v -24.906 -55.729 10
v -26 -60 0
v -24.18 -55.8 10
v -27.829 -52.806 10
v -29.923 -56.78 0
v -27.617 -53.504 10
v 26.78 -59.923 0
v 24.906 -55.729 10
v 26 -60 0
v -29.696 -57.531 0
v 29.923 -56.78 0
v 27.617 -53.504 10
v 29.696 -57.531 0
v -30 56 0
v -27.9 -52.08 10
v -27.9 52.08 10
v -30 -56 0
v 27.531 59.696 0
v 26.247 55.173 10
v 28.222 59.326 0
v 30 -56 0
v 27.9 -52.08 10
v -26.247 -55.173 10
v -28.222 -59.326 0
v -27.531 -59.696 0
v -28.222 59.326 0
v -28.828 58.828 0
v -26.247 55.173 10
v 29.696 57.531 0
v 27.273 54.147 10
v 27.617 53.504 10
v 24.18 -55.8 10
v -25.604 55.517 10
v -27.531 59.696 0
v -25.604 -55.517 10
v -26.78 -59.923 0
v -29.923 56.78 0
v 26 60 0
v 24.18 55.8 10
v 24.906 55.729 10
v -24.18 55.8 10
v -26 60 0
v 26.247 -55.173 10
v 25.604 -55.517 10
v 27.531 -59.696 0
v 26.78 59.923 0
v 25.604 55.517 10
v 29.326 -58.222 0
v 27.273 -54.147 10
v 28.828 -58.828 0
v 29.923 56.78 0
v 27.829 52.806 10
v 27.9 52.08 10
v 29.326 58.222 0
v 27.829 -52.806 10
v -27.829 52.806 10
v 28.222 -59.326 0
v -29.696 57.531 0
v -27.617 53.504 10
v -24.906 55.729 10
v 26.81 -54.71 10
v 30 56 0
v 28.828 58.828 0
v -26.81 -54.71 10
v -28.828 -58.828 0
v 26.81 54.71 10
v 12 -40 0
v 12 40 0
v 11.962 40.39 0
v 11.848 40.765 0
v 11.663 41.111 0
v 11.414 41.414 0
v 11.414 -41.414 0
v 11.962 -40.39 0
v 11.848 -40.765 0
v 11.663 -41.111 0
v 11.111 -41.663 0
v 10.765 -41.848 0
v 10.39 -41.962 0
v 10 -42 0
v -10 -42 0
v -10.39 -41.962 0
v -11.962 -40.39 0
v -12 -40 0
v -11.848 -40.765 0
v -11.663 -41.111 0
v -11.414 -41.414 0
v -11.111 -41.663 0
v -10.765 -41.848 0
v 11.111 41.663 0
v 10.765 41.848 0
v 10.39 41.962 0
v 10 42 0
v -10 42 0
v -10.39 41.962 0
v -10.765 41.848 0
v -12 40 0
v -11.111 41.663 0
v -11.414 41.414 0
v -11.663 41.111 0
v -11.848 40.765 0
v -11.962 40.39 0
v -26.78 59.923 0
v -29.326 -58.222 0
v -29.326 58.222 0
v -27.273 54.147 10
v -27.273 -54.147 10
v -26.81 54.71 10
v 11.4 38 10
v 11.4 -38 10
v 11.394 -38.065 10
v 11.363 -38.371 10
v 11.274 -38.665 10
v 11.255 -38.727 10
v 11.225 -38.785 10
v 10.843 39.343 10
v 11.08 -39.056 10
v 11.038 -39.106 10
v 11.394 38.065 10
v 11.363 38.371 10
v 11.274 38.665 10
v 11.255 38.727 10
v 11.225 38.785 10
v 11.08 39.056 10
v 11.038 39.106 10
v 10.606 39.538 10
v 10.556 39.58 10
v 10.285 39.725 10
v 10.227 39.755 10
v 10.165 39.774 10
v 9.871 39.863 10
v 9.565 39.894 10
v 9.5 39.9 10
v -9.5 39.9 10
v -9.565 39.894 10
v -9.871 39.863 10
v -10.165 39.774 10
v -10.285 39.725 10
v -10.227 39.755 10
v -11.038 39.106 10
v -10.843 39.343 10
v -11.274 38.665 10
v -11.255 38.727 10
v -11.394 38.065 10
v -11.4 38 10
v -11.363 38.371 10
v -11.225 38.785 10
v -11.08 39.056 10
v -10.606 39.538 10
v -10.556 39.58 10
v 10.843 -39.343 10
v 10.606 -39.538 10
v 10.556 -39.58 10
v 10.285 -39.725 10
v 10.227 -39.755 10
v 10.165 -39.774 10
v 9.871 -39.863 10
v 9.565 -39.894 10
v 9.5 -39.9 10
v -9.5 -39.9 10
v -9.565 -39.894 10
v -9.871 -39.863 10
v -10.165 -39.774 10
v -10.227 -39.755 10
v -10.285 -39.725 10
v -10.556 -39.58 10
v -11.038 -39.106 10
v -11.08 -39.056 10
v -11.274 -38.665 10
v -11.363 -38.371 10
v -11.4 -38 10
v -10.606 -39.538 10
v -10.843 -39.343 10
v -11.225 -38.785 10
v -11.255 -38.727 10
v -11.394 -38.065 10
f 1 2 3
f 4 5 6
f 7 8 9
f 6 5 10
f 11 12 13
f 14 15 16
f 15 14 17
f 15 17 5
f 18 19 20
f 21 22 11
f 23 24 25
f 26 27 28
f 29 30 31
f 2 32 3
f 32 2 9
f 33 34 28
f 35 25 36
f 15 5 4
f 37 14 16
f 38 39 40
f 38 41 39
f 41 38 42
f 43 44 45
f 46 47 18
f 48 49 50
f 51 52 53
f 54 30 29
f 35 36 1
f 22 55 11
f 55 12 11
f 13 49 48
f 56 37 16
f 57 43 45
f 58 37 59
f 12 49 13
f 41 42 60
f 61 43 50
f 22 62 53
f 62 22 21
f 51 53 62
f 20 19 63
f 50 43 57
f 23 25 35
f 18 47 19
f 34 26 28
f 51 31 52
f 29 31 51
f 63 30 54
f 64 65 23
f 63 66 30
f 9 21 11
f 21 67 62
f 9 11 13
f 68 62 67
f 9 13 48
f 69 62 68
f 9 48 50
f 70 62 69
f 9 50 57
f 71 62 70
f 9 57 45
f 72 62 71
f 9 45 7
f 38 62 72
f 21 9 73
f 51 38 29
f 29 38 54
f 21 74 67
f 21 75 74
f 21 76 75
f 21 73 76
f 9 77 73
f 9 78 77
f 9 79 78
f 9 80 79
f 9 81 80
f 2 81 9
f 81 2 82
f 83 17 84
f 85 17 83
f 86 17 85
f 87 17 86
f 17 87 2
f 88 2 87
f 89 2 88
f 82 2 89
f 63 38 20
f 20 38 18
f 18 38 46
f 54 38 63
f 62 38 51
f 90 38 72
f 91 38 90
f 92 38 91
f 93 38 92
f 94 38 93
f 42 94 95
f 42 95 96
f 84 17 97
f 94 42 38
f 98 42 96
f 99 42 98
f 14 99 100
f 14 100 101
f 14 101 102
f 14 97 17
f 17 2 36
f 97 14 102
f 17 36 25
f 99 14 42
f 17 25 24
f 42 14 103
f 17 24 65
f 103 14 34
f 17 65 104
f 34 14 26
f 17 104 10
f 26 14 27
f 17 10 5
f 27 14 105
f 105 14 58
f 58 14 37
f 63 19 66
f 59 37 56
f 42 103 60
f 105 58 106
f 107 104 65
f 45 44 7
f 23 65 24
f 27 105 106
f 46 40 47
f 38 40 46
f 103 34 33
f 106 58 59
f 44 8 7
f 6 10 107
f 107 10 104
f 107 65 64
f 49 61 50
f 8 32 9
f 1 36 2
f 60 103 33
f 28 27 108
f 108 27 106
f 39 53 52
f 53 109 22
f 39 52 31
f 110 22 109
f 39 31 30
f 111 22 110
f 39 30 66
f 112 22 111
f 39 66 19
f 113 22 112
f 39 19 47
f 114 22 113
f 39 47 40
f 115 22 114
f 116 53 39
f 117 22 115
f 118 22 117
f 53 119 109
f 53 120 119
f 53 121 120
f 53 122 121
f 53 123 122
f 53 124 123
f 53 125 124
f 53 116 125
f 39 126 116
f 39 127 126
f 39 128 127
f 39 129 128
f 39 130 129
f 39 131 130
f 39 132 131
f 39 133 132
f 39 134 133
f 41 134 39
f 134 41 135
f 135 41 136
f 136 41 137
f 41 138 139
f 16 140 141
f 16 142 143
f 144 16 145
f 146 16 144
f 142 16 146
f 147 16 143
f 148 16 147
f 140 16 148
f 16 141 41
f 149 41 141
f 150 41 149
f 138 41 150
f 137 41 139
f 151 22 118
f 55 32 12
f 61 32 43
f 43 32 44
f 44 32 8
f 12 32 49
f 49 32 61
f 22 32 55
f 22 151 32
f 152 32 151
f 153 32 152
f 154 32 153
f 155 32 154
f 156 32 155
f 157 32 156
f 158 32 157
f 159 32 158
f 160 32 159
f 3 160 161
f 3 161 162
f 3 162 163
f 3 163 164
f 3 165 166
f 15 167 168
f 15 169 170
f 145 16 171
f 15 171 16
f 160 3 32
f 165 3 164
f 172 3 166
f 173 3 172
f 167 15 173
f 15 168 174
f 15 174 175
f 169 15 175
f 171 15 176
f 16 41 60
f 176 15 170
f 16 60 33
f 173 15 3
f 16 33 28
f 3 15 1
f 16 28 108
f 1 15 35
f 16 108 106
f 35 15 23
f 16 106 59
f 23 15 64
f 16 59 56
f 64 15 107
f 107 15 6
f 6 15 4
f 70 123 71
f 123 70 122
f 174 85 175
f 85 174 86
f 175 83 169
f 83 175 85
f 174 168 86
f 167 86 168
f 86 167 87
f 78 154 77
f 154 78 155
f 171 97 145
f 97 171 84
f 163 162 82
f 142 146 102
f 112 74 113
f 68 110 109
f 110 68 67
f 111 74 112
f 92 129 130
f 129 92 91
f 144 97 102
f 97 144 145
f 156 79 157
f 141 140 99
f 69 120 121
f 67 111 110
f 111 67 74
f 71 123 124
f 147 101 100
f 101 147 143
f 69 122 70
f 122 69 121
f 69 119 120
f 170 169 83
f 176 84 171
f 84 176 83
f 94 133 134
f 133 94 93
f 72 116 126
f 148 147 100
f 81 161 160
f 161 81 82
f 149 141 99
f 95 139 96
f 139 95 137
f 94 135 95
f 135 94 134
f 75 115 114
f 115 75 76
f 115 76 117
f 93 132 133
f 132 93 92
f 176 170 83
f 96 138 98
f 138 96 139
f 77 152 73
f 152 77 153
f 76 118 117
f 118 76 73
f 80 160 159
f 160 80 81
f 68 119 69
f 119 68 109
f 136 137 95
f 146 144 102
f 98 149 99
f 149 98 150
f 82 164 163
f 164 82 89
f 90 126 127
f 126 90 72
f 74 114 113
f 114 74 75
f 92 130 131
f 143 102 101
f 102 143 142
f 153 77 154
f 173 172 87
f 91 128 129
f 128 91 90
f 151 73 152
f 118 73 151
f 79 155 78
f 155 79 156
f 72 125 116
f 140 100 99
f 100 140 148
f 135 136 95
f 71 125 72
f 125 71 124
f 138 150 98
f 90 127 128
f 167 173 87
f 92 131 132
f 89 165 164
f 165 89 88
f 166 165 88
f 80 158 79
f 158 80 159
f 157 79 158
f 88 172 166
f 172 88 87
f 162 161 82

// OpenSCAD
$fn = 32;

// ----------------------------------------------------------------------
// Display bezel: 60 x 120 mm frame, opening 24x84 mm
// ----------------------------------------------------------------------

// --- parameters (mm) ---
length = 60;              // frame outside length, X
width = 120;              // frame outside width, Y
frame_w = 18;             // frame width
thickness = 10;           // frame thickness
corner_r = 4;             // outside corner radius
chamfer = 0.93;           // outer wall taper
funnel = 0.94;            // inner opening taper
opening_l = 24;           // opening length
opening_w = 84;           // opening width
inner_r = 2;              // opening corner radius

/* rounded-rectangle outlines, generated with loops */
module rounded_ring(l_nom, w_nom, r) {
  hull() {
    for (sx = [-1, 1]) for (sy = [-1, 1])
      translate([sx * (l_nom / 2 - r), sy * (w_nom / 2 - r)]) circle(r = r);
  }
}

difference() {
  /* frame body, drafted so the outer edge is a variable-depth chamfer */
  linear_extrude(height = thickness, scale = chamfer)
    rounded_ring(length, width, corner_r);
  /* viewing opening, drafted the other way for a funnel edge */
  linear_extrude(height = thickness + 2, scale = funnel)
    translate([0, 0, -1]) rounded_ring(opening_l, opening_w, inner_r);
}
